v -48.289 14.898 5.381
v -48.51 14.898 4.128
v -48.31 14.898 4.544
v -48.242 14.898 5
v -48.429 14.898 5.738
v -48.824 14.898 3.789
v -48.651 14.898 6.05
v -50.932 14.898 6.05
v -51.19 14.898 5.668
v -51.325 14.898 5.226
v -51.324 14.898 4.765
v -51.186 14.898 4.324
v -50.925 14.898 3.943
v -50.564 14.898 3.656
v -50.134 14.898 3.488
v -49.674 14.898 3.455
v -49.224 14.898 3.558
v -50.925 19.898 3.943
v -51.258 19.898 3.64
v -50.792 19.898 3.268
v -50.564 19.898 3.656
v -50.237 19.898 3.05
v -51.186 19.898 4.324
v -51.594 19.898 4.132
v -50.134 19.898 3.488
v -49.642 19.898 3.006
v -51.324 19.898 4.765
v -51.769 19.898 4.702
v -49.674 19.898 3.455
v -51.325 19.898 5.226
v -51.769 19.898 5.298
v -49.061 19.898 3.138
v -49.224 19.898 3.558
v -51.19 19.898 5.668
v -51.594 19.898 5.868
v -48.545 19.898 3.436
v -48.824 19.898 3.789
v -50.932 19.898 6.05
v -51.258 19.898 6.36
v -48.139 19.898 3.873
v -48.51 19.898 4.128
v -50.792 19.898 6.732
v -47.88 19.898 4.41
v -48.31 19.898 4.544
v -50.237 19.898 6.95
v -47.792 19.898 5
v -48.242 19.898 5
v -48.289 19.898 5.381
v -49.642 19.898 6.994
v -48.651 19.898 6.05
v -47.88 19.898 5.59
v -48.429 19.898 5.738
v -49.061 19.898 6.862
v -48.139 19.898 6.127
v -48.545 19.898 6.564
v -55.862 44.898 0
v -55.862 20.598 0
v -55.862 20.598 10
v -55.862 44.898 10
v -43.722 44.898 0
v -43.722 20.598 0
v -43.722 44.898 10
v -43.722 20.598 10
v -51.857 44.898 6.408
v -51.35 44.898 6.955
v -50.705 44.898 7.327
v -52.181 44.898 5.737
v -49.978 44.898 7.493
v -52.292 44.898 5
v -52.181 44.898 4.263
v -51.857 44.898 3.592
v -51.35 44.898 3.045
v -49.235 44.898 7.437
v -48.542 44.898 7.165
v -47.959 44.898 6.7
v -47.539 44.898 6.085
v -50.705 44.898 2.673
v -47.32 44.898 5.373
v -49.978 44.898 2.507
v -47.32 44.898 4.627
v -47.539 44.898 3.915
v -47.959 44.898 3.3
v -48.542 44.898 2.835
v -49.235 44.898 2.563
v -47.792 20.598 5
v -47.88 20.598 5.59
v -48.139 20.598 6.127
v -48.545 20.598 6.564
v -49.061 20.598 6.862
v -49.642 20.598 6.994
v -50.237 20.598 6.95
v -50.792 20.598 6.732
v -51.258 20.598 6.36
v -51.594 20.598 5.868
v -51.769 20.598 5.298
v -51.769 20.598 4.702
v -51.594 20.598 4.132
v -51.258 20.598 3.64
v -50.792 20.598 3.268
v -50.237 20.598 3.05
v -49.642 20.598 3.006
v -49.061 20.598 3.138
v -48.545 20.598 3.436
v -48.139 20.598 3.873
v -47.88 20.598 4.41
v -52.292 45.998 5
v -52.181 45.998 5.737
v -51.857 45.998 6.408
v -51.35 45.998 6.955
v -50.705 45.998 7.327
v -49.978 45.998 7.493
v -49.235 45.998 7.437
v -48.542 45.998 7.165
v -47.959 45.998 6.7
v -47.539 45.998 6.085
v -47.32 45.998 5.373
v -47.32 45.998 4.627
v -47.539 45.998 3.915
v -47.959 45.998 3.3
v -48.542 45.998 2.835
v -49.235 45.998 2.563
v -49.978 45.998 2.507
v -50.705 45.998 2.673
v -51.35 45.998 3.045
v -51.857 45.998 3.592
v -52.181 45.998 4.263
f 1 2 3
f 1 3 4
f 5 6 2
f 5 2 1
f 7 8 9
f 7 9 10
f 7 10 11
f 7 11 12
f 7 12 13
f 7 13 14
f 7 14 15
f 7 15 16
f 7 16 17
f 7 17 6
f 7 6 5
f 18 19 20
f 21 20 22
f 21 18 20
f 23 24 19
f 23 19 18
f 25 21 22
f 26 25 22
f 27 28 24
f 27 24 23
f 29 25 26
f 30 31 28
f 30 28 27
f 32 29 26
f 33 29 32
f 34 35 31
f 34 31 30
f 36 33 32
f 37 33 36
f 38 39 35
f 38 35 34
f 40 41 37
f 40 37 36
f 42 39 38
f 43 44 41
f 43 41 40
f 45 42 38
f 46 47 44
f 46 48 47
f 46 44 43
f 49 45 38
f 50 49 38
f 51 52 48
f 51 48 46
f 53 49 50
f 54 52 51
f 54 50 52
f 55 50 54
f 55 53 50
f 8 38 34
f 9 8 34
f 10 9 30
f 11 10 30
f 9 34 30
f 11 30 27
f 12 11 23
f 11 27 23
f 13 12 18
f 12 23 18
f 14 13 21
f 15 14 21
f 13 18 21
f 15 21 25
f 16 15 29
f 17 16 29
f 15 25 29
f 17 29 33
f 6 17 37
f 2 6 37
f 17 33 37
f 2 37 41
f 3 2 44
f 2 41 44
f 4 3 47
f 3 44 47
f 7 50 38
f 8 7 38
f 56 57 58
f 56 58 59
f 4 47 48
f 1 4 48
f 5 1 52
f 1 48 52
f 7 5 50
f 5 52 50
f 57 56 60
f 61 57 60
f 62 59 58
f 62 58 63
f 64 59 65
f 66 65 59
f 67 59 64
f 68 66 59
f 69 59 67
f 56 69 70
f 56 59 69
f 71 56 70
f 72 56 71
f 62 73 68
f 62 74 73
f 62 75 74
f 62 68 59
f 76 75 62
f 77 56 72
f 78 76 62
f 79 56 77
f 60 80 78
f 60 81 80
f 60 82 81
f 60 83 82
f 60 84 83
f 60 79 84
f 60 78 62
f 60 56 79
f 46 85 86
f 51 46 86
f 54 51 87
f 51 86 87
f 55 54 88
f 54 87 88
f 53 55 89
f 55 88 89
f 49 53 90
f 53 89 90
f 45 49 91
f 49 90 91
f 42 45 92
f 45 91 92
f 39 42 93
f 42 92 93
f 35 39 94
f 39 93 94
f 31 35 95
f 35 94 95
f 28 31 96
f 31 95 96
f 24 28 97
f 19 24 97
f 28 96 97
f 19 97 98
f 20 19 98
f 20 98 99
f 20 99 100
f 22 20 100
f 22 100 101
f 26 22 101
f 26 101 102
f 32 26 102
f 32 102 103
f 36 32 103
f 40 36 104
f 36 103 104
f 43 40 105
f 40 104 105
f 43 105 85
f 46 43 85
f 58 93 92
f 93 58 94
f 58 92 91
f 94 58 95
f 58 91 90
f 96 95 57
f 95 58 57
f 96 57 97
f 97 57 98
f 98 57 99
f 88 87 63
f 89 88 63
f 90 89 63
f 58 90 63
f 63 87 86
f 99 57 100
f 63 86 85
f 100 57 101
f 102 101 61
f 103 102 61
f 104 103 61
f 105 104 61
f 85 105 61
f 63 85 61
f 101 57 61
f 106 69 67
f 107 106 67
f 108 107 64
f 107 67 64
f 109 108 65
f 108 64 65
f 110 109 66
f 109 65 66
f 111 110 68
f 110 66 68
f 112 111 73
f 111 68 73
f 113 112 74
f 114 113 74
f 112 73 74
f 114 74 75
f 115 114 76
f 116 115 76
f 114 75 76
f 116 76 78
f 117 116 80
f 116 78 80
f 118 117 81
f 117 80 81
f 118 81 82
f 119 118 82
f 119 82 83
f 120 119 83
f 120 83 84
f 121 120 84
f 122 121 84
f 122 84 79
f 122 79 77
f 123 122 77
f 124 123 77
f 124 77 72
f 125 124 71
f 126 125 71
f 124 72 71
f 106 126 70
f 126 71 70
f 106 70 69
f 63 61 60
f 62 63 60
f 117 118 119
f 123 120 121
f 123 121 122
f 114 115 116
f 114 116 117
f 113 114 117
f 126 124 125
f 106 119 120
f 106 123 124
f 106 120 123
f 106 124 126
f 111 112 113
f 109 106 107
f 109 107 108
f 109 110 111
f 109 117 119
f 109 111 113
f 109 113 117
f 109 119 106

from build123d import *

# Parameters (mm, degrees)
F0_W     = 12.14
F0_H     = 24.3
F1_DEPTH = 10
F2_R     = 2.5
F3_DEPTH = 1.1
F4_R     = 2
F5_DEPTH = 0.7
F7_DEPTH = 5


with BuildPart() as f1:
    # F0 (on Top) → F1 (new body)
    with BuildSketch(Plane.XY):
        with Locations((-49.791635, 32.747907)):
            Rectangle(F0_W, F0_H)
    extrude(amount=F1_DEPTH)

    # F2 (on face) → F3 (join)
    with BuildSketch(Plane(origin=(0, 44.897907, 0), x_dir=(-1, 0, 0), z_dir=(0, 1, 0))):
        with Locations((49.791635, 5)):
            Circle(F2_R)
    extrude(amount=F3_DEPTH)

    # F4 (on face) → F5 (join)
    with BuildSketch(Plane.XZ.offset(-20.597907)):
        with Locations((-49.791635, 5)):
            Circle(F4_R)
    extrude(amount=F5_DEPTH)

    # F6 (on face) → F7 (join)
    with BuildSketch(Plane.XZ.offset(-19.897907)):
        with BuildLine():
            ThreePointArc((-50.931811, 6.05), (-50.355208, 3.556087), (-48.241635, 5))
            ThreePointArc((-48.241635, 5), (-48.347722, 5.563573), (-48.65146, 6.05))
            Line((-48.65146, 6.05), (-50.931811, 6.05))
        make_face()
    extrude(amount=F7_DEPTH)


with BuildPart() as f8_1:
    # F8: copy of F1
    add(f1.part.moved(Location((20, 0, 0))))


solid = f1.part
